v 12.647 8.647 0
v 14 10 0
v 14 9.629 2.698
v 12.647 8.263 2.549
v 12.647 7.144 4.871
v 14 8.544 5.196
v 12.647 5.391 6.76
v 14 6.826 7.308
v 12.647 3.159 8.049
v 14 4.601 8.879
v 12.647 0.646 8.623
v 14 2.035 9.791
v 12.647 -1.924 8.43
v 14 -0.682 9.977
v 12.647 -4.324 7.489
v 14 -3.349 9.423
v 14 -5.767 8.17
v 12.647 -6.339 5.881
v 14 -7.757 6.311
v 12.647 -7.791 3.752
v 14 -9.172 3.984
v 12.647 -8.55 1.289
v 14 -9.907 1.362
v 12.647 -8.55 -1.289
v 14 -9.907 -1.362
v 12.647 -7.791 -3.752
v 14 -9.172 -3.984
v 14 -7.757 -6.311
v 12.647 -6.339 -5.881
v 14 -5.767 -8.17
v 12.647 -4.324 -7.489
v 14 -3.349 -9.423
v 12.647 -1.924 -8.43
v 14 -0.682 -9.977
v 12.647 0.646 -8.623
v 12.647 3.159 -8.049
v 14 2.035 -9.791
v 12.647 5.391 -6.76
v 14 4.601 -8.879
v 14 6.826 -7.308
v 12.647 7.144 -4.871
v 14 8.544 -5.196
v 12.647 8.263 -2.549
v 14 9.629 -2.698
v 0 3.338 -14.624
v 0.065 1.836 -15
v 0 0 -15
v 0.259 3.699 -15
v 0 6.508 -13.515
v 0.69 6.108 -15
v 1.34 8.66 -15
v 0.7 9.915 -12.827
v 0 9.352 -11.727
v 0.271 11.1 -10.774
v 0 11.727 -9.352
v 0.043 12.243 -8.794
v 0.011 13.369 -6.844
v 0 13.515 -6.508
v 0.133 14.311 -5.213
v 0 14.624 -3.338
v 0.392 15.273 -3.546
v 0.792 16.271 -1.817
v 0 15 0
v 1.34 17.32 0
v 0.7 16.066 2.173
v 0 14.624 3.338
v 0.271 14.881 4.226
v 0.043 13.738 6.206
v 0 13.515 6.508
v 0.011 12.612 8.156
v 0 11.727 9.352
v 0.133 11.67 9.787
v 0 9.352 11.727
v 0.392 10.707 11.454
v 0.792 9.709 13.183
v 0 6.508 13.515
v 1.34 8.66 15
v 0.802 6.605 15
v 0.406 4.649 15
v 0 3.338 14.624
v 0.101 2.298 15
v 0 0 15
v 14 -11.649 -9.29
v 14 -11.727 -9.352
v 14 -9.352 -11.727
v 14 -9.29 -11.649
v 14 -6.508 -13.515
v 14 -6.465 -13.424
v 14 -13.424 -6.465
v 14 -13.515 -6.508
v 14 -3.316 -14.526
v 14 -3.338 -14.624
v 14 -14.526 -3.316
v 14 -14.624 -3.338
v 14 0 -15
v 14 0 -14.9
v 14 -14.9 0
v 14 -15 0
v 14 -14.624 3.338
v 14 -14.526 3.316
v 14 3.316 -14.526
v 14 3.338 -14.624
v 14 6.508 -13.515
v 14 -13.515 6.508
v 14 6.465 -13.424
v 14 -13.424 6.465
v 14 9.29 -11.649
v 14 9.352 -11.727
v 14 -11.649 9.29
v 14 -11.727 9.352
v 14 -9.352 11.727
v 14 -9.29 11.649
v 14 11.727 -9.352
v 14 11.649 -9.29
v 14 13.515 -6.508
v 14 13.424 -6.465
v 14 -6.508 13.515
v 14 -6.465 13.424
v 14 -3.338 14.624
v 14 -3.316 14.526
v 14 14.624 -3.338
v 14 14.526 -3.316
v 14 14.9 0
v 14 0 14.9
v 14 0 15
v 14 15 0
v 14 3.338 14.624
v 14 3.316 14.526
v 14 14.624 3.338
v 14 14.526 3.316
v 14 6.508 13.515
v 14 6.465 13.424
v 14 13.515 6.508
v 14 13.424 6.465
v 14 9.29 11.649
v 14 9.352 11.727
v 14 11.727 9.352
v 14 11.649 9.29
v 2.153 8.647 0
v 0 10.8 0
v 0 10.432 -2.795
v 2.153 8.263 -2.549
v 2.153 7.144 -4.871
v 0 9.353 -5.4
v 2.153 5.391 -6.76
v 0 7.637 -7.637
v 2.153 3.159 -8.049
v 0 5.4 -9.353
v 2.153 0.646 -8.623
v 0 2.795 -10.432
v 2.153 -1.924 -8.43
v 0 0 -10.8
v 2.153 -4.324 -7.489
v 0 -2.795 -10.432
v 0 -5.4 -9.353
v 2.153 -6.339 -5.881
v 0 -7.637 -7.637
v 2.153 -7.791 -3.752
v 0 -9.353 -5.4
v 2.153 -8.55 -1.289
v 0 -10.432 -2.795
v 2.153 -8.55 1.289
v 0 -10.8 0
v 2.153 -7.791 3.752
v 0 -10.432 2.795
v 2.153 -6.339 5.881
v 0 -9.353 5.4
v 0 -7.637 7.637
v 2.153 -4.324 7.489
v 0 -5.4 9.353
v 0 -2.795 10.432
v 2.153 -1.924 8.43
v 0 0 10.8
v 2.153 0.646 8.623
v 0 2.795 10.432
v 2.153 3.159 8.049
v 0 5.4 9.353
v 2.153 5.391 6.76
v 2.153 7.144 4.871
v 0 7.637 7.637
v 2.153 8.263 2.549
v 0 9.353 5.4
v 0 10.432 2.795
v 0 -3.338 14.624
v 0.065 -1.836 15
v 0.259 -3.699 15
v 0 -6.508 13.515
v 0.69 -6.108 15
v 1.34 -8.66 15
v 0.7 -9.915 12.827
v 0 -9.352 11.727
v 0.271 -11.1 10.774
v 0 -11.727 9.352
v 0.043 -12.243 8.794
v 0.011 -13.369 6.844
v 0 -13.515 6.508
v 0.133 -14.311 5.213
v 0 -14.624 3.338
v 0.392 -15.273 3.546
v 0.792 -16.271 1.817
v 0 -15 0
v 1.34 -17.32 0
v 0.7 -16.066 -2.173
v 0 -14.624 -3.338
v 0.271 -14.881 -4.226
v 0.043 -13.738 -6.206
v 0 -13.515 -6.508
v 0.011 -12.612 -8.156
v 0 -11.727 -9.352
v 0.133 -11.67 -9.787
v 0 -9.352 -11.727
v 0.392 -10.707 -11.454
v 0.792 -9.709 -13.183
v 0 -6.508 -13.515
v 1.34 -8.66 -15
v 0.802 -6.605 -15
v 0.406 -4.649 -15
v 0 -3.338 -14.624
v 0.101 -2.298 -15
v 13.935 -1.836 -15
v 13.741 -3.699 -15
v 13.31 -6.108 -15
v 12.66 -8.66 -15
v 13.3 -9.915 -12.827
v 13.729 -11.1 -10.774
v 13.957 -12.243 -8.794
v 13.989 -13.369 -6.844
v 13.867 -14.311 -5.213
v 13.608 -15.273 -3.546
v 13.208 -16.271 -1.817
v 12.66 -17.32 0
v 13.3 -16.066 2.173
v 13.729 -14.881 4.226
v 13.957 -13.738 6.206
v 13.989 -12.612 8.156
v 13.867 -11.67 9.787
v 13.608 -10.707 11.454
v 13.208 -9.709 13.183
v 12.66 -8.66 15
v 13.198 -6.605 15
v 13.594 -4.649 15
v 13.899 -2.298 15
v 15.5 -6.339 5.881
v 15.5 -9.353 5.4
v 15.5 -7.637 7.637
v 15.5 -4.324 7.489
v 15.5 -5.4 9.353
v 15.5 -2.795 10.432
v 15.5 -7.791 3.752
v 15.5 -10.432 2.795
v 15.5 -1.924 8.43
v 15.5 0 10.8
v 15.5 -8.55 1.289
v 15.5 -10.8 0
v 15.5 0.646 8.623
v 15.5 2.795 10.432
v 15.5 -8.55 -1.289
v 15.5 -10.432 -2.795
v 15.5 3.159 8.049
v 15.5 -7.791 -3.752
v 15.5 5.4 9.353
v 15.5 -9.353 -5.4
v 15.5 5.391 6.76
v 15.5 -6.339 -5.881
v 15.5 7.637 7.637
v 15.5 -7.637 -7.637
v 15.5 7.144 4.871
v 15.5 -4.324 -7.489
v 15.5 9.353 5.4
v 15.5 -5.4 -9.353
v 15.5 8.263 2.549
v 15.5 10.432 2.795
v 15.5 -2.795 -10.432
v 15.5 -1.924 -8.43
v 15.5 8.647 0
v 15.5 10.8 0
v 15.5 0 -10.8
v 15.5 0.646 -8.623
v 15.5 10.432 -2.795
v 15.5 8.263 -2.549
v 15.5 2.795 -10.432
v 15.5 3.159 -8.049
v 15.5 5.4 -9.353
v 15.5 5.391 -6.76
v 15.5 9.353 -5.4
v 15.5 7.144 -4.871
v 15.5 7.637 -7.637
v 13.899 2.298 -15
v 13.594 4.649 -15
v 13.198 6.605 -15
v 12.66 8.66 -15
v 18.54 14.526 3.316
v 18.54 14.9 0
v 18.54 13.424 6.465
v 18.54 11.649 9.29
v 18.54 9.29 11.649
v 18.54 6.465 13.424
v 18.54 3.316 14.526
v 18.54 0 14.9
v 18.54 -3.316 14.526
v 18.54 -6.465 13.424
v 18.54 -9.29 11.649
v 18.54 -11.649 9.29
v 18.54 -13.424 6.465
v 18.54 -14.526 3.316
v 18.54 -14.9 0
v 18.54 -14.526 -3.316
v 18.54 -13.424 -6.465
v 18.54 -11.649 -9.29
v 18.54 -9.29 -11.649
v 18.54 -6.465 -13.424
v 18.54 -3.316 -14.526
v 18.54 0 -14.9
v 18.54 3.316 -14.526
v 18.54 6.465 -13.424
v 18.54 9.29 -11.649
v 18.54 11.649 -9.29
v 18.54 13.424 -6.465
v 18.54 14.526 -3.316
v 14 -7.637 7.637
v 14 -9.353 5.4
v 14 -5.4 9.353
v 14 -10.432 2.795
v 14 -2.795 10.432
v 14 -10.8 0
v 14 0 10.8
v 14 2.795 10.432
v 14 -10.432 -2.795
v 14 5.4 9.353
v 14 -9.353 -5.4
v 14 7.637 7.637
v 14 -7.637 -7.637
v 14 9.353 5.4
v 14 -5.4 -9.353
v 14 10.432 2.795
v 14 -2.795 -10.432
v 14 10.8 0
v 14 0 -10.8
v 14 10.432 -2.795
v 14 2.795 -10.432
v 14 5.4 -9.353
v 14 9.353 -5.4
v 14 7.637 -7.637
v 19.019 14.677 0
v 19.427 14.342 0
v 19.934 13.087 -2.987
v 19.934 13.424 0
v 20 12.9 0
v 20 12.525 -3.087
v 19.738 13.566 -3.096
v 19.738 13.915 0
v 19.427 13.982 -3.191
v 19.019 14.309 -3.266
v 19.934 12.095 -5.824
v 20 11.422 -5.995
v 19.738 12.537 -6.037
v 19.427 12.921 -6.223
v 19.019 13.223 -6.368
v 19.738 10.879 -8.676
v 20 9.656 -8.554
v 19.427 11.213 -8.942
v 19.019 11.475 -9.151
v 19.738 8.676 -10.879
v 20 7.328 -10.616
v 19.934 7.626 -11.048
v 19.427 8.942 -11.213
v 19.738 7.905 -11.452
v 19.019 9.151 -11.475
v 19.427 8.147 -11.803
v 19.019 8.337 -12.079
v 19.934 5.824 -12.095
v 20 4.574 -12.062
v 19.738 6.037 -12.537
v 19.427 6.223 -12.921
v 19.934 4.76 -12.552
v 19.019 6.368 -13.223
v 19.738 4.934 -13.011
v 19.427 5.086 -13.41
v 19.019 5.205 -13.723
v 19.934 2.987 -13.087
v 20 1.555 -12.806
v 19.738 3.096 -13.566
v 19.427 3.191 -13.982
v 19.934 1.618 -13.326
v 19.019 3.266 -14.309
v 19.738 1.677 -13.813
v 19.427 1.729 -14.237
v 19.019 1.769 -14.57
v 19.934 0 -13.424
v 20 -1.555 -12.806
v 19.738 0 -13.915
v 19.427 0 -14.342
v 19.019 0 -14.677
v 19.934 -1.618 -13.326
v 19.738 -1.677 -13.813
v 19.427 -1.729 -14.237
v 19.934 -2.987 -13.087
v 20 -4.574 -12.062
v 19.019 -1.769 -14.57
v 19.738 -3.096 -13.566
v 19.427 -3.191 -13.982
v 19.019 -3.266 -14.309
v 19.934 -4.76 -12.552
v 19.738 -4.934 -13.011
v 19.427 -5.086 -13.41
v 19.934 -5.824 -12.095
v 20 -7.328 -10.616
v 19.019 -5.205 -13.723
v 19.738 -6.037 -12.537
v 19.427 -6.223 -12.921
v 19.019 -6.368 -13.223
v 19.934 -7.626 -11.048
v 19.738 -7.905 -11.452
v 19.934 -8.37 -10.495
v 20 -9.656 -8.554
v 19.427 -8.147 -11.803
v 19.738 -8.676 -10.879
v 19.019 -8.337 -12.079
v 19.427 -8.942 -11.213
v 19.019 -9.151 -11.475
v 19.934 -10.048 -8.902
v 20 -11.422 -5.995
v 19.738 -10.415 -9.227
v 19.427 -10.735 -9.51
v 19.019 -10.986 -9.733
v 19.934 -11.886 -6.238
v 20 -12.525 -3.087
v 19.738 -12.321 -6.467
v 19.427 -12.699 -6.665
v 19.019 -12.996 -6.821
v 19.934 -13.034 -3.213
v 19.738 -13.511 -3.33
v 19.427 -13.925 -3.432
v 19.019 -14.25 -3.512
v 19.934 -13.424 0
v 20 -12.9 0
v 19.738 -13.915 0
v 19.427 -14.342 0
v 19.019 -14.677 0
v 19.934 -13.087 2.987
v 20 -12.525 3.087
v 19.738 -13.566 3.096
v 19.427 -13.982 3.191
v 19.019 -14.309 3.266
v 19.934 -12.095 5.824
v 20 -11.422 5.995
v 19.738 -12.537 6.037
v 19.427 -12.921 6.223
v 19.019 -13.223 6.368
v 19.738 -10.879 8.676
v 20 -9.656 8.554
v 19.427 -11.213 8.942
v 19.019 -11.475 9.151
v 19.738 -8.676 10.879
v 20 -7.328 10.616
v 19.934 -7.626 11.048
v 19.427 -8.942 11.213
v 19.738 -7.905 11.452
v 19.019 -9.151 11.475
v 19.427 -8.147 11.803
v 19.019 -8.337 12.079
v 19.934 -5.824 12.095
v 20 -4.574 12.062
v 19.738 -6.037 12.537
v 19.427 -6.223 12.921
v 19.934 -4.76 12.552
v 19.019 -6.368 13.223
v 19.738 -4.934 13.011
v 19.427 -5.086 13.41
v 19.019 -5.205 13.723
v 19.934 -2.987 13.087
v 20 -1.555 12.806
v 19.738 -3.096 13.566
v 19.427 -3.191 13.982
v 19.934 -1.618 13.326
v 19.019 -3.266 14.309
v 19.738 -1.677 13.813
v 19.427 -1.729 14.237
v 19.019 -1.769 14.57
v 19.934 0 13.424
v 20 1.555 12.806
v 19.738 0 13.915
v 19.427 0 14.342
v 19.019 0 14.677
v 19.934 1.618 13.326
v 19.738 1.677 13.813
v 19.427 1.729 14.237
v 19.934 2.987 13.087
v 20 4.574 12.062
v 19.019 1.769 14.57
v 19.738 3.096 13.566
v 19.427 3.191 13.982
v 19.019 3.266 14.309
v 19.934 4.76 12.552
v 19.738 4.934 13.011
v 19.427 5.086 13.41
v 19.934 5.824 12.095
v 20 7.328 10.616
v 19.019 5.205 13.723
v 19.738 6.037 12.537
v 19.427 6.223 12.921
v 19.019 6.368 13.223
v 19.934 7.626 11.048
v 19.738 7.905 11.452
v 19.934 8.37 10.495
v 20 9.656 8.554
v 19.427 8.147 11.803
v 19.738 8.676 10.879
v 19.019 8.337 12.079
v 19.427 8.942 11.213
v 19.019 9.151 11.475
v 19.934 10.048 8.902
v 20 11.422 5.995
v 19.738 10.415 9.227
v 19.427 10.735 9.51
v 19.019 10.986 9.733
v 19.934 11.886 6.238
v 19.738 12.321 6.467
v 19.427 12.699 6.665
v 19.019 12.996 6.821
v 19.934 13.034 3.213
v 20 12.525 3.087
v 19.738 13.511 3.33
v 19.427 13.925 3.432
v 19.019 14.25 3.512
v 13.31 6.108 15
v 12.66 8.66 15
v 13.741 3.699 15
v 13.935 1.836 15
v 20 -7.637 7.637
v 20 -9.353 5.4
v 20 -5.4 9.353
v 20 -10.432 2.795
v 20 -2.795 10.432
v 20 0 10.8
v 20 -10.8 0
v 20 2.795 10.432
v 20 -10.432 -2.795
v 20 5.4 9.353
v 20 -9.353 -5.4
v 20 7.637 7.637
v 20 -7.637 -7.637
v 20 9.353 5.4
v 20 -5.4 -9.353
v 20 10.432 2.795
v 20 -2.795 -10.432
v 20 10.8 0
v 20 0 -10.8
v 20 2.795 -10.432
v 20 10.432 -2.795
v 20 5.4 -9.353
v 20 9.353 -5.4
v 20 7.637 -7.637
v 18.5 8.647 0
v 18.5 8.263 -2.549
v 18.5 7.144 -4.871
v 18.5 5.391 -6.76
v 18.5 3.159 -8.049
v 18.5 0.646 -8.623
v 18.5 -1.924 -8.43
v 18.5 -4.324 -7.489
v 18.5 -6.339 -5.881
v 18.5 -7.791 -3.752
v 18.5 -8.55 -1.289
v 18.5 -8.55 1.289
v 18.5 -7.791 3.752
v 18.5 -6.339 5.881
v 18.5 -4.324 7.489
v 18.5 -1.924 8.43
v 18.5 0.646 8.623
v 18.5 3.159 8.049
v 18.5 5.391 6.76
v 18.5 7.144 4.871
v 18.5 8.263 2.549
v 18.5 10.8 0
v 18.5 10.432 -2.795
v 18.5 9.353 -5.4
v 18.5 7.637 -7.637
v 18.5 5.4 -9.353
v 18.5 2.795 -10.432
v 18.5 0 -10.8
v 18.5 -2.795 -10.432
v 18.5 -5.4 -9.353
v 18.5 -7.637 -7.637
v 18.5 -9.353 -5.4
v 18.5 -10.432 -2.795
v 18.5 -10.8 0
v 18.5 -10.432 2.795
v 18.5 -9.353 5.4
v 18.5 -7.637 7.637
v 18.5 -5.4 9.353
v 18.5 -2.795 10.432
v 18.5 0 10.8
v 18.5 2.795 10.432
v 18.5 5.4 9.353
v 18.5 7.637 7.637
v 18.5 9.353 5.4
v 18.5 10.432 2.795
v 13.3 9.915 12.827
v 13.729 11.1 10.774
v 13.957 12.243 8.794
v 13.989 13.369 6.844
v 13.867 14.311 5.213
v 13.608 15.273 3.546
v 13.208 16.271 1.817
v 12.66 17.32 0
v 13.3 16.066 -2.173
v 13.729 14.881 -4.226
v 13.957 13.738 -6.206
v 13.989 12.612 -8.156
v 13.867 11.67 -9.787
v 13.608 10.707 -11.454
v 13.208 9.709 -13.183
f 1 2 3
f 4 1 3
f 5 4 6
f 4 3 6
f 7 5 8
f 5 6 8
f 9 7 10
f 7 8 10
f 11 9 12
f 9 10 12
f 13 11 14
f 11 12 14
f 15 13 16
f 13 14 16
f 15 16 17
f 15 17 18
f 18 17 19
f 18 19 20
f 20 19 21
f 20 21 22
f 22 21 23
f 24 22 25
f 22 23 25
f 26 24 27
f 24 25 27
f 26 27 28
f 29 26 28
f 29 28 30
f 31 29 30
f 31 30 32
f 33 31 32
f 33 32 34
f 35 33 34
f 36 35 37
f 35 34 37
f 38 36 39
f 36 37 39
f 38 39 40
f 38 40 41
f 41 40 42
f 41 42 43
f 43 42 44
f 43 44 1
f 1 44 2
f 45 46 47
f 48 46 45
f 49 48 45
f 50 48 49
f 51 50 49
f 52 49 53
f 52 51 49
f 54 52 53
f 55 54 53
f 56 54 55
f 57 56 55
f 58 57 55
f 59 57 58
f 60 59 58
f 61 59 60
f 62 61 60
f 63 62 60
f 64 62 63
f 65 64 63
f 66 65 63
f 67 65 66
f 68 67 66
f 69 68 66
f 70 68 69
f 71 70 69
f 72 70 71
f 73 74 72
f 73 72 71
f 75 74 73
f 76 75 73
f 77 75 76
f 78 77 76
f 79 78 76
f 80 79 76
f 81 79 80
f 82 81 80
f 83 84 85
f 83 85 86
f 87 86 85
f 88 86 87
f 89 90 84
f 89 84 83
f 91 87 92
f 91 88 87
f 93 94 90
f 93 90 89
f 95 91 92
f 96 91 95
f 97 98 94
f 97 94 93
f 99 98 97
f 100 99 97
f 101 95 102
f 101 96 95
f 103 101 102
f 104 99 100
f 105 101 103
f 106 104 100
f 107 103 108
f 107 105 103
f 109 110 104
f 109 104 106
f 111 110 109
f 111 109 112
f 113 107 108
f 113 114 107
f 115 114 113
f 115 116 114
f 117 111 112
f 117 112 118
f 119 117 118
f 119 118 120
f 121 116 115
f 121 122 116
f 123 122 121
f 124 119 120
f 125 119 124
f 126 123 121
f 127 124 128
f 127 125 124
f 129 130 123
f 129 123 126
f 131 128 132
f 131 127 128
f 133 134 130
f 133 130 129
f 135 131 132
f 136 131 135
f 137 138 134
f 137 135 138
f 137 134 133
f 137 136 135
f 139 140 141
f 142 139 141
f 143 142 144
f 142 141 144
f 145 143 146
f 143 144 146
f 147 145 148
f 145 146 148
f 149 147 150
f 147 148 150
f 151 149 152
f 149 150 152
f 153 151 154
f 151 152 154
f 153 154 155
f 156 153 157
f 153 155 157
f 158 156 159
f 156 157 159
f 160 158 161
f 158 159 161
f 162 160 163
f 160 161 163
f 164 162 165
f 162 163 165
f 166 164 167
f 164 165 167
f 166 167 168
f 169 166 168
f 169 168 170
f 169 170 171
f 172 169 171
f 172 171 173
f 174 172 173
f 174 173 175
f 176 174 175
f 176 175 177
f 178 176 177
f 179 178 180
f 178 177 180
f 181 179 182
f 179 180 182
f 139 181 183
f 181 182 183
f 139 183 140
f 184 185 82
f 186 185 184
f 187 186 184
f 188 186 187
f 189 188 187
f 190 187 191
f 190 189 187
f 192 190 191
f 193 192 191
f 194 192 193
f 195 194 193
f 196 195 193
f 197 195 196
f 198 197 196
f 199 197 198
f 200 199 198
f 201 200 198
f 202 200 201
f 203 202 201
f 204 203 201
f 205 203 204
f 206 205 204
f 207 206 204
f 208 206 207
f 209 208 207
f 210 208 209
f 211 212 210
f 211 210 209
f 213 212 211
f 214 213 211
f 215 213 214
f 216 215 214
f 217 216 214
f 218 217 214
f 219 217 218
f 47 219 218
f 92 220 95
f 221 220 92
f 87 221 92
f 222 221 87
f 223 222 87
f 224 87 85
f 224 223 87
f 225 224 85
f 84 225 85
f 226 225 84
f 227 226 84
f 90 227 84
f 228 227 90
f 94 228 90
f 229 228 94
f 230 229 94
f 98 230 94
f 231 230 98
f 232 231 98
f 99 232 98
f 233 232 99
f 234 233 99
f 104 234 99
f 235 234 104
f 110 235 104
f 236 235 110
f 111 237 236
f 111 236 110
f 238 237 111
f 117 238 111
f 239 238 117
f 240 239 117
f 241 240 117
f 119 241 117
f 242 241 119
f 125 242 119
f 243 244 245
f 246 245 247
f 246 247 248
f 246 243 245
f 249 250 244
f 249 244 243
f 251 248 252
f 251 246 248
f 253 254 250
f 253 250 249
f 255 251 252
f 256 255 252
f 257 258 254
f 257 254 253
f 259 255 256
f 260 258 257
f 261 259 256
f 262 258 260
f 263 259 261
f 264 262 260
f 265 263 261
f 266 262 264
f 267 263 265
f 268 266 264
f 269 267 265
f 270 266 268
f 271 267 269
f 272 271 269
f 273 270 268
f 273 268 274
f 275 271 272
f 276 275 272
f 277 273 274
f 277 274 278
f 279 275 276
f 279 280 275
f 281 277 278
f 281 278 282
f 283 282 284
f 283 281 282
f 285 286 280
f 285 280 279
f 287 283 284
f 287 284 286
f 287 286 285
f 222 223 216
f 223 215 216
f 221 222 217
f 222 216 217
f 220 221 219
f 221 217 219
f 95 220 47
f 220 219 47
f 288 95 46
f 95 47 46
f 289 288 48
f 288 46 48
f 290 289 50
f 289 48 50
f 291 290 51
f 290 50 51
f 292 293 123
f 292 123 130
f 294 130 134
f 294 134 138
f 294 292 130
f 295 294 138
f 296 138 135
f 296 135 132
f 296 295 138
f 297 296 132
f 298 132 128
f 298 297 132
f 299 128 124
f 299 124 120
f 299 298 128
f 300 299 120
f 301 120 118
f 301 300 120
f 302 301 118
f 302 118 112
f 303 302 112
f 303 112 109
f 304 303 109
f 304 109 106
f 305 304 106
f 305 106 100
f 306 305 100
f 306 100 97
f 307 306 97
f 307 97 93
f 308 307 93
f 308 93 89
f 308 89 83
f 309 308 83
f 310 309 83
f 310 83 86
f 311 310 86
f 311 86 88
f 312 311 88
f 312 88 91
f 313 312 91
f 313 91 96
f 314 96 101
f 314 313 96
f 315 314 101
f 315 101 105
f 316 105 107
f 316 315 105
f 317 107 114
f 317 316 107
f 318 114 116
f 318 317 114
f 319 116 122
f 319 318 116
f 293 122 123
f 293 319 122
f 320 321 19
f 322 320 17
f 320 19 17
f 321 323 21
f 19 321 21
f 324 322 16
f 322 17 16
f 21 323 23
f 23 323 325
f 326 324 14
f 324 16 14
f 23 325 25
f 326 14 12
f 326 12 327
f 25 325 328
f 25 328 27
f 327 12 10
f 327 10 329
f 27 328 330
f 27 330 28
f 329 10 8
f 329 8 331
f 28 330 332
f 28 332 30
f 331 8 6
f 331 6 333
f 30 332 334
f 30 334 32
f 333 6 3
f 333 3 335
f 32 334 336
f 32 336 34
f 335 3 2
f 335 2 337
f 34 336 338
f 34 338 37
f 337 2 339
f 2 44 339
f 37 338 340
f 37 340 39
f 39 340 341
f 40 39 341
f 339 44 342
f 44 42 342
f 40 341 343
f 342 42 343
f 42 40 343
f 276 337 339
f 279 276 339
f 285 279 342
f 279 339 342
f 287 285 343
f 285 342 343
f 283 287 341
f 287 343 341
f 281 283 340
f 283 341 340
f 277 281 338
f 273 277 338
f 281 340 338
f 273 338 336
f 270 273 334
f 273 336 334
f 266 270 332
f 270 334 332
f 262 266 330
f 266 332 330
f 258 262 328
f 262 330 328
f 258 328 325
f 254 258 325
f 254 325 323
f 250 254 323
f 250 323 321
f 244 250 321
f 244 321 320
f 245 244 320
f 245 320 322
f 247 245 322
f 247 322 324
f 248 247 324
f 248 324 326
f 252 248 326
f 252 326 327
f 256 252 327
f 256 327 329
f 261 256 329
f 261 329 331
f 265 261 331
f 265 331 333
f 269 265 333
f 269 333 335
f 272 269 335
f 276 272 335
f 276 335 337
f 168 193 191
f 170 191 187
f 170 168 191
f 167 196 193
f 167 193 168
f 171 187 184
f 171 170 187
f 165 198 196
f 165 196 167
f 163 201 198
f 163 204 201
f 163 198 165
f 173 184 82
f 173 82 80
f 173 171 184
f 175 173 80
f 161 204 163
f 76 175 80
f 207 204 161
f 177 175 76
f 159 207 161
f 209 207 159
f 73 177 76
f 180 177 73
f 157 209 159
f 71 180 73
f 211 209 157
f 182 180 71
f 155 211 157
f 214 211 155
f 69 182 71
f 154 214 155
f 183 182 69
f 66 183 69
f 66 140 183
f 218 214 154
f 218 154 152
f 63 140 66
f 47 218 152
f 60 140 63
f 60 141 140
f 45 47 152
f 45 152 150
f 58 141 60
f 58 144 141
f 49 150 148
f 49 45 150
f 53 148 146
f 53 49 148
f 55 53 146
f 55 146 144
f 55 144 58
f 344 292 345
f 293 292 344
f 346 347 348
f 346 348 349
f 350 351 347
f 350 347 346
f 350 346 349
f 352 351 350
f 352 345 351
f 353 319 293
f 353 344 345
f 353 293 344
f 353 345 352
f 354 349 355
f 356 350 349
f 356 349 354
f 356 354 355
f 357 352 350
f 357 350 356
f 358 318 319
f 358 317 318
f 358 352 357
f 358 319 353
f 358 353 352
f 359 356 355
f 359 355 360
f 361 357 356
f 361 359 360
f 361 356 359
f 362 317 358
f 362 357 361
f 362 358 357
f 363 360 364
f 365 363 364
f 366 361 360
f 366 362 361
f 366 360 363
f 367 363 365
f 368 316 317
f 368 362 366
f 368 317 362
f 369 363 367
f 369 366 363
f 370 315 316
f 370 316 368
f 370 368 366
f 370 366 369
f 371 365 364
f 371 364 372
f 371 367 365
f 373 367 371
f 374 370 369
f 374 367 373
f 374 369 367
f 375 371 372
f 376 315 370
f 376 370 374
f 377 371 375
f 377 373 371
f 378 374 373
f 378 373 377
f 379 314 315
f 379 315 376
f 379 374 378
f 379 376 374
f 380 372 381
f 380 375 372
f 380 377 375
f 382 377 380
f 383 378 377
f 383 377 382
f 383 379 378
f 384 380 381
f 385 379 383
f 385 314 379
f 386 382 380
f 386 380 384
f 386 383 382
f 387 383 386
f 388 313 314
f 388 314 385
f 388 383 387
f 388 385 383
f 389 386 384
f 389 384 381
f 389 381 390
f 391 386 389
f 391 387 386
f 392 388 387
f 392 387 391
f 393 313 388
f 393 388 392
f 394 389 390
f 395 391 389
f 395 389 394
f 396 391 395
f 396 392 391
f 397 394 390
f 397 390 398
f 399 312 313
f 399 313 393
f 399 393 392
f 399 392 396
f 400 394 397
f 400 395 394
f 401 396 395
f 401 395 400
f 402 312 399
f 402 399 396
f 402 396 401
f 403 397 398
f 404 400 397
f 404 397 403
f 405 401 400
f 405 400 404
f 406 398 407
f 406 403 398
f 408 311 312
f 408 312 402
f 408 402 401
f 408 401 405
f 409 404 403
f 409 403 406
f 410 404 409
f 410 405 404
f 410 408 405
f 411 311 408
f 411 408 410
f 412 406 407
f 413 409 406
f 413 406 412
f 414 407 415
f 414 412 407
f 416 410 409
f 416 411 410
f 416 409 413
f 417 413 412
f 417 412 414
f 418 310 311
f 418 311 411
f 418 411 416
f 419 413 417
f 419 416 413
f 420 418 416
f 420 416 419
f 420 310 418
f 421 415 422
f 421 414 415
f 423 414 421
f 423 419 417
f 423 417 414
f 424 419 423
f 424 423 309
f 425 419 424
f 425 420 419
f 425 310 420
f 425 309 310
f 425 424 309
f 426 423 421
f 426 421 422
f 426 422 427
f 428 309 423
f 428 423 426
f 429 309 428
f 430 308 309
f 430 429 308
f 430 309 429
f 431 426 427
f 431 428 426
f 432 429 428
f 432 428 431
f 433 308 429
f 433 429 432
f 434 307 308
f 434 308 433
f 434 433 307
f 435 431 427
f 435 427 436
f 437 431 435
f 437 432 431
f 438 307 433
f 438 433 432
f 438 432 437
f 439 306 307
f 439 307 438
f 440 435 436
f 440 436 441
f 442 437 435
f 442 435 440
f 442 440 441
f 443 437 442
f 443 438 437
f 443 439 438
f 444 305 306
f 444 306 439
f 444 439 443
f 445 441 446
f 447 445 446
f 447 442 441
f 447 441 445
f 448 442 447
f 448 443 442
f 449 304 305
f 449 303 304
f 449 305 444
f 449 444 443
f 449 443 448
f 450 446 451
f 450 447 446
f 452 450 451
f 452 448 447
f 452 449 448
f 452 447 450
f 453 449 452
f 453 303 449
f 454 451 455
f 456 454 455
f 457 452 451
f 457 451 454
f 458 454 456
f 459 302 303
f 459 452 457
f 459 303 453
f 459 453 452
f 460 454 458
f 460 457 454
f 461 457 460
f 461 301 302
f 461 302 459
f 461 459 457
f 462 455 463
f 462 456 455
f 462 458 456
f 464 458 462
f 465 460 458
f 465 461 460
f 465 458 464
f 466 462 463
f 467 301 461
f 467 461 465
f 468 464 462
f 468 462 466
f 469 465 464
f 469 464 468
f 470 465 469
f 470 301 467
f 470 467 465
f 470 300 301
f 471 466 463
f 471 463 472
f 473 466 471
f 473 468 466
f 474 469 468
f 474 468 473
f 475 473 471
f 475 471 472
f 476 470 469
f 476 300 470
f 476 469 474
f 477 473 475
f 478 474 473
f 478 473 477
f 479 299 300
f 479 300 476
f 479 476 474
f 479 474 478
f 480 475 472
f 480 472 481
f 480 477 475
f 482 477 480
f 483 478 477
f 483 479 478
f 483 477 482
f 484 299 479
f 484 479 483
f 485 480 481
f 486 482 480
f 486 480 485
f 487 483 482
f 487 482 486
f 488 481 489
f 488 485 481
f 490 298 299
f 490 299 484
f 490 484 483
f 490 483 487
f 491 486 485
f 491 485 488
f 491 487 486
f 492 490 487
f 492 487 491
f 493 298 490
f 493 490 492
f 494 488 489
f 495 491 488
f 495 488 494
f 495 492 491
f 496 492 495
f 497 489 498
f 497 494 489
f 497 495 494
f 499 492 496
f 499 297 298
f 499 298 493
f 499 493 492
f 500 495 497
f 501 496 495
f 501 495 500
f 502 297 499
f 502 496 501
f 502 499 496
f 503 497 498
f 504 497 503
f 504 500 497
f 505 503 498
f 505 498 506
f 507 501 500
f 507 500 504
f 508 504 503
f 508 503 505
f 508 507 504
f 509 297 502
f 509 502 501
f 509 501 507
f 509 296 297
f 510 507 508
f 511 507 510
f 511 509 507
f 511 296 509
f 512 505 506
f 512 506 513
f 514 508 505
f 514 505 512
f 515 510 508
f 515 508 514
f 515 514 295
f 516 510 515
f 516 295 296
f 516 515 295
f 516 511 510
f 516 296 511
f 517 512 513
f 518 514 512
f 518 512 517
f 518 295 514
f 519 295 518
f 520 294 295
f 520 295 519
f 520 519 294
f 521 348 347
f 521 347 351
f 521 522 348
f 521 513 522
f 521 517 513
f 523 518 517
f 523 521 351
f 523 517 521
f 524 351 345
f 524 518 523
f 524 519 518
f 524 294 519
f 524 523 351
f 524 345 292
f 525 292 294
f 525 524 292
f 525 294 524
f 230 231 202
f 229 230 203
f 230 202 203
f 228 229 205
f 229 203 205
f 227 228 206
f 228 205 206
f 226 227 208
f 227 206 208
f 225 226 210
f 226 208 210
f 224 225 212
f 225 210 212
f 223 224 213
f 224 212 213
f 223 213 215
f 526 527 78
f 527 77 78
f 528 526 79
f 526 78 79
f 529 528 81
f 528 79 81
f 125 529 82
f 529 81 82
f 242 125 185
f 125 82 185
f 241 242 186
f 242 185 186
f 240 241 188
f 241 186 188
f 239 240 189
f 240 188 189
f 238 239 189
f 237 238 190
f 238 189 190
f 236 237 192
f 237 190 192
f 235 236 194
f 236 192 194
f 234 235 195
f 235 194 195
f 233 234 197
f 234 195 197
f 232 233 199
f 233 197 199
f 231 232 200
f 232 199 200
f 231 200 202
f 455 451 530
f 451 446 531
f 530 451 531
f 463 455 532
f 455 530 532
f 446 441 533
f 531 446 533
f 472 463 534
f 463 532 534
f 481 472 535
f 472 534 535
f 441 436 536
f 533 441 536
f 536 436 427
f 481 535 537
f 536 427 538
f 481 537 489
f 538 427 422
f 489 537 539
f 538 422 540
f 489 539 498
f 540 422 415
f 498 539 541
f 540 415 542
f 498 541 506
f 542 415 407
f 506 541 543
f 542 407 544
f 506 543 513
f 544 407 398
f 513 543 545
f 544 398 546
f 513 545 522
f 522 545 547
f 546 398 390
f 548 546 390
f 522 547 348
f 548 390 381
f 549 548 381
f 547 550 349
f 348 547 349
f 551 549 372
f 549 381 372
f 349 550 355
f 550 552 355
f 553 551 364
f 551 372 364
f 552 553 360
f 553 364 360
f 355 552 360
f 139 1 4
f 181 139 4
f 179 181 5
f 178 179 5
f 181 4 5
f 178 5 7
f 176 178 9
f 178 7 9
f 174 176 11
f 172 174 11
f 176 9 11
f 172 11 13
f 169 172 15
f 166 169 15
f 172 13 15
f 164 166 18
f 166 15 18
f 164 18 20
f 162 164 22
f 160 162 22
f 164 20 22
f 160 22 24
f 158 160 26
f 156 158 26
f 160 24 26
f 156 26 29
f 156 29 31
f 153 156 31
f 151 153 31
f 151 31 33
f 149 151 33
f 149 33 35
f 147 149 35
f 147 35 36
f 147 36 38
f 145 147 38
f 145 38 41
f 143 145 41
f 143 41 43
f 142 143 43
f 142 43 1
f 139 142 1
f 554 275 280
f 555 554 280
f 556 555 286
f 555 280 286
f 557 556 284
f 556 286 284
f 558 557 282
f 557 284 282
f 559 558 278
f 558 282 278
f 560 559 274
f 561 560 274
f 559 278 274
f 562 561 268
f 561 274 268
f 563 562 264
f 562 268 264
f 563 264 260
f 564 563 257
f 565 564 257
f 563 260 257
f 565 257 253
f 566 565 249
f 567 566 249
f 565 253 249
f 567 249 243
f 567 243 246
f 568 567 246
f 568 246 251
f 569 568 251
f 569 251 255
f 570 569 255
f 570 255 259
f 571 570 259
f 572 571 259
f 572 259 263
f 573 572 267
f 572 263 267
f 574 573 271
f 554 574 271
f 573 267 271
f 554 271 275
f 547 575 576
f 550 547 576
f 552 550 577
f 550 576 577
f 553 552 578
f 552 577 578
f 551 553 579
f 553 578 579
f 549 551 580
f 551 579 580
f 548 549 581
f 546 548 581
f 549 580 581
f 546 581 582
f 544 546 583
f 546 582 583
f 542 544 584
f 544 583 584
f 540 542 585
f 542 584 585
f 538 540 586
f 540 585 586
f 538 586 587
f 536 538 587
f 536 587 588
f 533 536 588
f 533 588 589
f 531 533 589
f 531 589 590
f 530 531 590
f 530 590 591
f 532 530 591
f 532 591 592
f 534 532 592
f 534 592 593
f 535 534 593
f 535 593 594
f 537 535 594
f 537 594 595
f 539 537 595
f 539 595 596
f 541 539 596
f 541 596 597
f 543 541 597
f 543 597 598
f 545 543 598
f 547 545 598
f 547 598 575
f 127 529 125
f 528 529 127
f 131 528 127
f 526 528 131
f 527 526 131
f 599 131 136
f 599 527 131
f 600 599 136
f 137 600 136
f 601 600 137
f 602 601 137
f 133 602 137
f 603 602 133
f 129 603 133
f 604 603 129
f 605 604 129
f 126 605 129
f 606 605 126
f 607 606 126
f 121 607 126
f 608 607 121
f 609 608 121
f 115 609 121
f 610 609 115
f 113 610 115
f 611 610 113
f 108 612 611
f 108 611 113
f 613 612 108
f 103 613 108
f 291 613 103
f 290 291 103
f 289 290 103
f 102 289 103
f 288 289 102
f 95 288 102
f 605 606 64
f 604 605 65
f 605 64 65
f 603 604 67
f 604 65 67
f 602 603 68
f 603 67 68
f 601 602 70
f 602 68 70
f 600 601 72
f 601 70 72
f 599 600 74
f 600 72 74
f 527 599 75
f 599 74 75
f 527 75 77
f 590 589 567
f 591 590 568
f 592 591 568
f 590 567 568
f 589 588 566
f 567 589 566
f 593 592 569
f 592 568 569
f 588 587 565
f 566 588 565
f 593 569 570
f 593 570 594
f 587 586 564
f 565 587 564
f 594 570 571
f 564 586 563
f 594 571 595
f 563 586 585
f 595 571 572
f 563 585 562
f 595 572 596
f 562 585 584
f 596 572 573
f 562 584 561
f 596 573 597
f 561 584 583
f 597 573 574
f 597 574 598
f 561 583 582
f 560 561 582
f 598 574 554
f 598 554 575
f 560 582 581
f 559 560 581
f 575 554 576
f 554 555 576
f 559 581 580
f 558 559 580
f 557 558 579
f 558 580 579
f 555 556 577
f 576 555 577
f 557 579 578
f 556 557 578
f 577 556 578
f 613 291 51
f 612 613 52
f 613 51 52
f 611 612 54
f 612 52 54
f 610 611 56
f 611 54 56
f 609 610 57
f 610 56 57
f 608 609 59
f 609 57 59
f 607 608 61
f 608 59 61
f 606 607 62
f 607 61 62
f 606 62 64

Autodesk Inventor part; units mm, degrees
sketch "Sketch_1" plane through (0, 0, 0) normal (0, 0, 1) x (1, 0, 0)
  line L0 (20, 0) -> (0, 0)
  line L1 (0, 0) -> (0, 18)
  line L2 (0, 18) -> (20, 18)
  line L3 (20, 18) -> (20, 10.8)
  line L4 (20, 10.8) -> (18.5, 10.8)
  line L5 (18.5, 10.8) -> (18.5, 8.647)
  line L6 (18.5, 8.647) -> (15.5, 8.647)
  line L7 (15.5, 8.647) -> (15.5, 10.8)
  line L8 (15.5, 10.8) -> (14, 10.8)
  line L9 (14, 10.8) -> (14, 0)
  line L10 (14, 0) -> (0, 0)
revolve "Revolution1" add sketch "Sketch_1" angle 360 about axis through (20, 0, 0) along (-1, 0, 0)
sketch "Sketch_2" plane through (0, 0, 0) normal (1, 0, 0) x (0, 1, 0)
  line L0 (30, 30) -> (-30, 30)
  line L1 (-30, 30) -> (-30, -30)
  line L2 (-30, -30) -> (30, -30)
  line L3 (30, -30) -> (30, 30)
  line L4 (-8.6603, 15) -> (-17.3205, 0)
  line L5 (-17.3205, 0) -> (-8.6603, -15)
  line L6 (-8.6603, -15) -> (8.6603, -15)
  line L7 (8.6603, -15) -> (17.3205, 0)
  line L8 (17.3205, 0) -> (8.6603, 15)
  line L9 (8.6603, 15) -> (-8.6603, 15)
extrude "Extrusion1" cut sketch "Sketch_2" along normal mid plane 42
sketch "Sketch_8" plane through (0, 0, 0) normal (0, 0, 1) x (1, 0, 0)
  line L0 (20, 0) -> (0, 0)
  line L1 (14, 18) -> (14, 14.9)
  line L2 (14, 14.9) -> (20, 14.9)
  line L3 (20, 14.9) -> (20, 18)
  line L4 (20, 18) -> (14, 18)
revolve "Revolution2" cut sketch "Sketch_8" angle 360 about axis through (20, 0, 0) along (1, 0, 0)
sketch "Sketch_4" plane through (0, 0, 0) normal (0, 0, 1) x (1, 0, 0)
  line L0 (14, 0) -> (0, 0)
  line L1 (0, 0) -> (0, 10.8)
  line L2 (0, 10.8) -> (2.153, 8.647)
  line L3 (2.153, 8.647) -> (12.647, 8.647)
  line L4 (12.647, 8.647) -> (14, 10)
  line L5 (14, 10) -> (14, 0)
  line L6 (14, 0) -> (0, 0)
revolve "Revolution3" cut sketch "Sketch_4" angle 360 about axis through (14, 0, 0) along (1, 0, 0)
thread "Thread1" size "M20x2.5" class "6H" standard "ISO Metric profile" full length
sketch "Sketch_5" plane through (0, 0, 0) normal (0, 0, 1) x (1, 0, 0)
  line L0 (20, 0) -> (0, 0)
  line L1 (17.8, 15) -> (17.9, 15)
  arc A0 (20, 12.9) -> (17.9, 15) centre (17.9, 12.9) ccw
  line L2 (20, 12.9) -> (20.1, 12.9)
  line L3 (20.1, 12.9) -> (20.1, 22.5)
  line L4 (20.1, 22.5) -> (17.8, 22.5)
  line L5 (17.8, 22.5) -> (17.8, 15)
revolve "Revolution4" cut sketch "Sketch_5" angle 360 about axis through (20, 0, 0) along (1, 0, 0)
sketch "Sketch_6" plane through (0, 0, 0) normal (0, 0, 1) x (1, 0, 0)
  line L0 (20, 0) -> (0, 0)
  line L1 (-1, 15) -> (0, 15)
  line L2 (0, 15) -> (4.3301, 22.5)
  line L3 (4.3301, 22.5) -> (9.6699, 22.5)
  line L4 (9.6699, 22.5) -> (14, 15)
  line L5 (14, 15) -> (15.5, 15)
  line L6 (15.5, 15) -> (15.5, 25.5)
  line L7 (15.5, 25.5) -> (-1, 25.5)
  line L8 (-1, 25.5) -> (-1, 15)
revolve "Revolution5" cut sketch "Sketch_6" angle 360 about axis through (20, 0, 0) along (1, 0, 0)
ref_plane "IP1_XY" through (0, 0, 0) normal (1, 0, 0) x (0, 0, -1)
ref_plane "IP1_YZ" through (0, 0, 0) normal (0, 0, -1) x (0, 1, 0)
ref_plane "IP1_ZX" through (0, 0, 0) normal (0, 1, 0) x (1, 0, 0)
ref_plane "IP2_XY" through (20, 0, 0) normal (1, 0, 0) x (0, 0, -1)
ref_plane "IP2_YZ" through (20, 0, 0) normal (0, 0, -1) x (0, 1, 0)
ref_plane "IP2_ZX" through (20, 0, 0) normal (0, 1, 0) x (1, 0, 0)
properties part number "BN 161 1118811 prevailing torque type hex lock nut M20"
